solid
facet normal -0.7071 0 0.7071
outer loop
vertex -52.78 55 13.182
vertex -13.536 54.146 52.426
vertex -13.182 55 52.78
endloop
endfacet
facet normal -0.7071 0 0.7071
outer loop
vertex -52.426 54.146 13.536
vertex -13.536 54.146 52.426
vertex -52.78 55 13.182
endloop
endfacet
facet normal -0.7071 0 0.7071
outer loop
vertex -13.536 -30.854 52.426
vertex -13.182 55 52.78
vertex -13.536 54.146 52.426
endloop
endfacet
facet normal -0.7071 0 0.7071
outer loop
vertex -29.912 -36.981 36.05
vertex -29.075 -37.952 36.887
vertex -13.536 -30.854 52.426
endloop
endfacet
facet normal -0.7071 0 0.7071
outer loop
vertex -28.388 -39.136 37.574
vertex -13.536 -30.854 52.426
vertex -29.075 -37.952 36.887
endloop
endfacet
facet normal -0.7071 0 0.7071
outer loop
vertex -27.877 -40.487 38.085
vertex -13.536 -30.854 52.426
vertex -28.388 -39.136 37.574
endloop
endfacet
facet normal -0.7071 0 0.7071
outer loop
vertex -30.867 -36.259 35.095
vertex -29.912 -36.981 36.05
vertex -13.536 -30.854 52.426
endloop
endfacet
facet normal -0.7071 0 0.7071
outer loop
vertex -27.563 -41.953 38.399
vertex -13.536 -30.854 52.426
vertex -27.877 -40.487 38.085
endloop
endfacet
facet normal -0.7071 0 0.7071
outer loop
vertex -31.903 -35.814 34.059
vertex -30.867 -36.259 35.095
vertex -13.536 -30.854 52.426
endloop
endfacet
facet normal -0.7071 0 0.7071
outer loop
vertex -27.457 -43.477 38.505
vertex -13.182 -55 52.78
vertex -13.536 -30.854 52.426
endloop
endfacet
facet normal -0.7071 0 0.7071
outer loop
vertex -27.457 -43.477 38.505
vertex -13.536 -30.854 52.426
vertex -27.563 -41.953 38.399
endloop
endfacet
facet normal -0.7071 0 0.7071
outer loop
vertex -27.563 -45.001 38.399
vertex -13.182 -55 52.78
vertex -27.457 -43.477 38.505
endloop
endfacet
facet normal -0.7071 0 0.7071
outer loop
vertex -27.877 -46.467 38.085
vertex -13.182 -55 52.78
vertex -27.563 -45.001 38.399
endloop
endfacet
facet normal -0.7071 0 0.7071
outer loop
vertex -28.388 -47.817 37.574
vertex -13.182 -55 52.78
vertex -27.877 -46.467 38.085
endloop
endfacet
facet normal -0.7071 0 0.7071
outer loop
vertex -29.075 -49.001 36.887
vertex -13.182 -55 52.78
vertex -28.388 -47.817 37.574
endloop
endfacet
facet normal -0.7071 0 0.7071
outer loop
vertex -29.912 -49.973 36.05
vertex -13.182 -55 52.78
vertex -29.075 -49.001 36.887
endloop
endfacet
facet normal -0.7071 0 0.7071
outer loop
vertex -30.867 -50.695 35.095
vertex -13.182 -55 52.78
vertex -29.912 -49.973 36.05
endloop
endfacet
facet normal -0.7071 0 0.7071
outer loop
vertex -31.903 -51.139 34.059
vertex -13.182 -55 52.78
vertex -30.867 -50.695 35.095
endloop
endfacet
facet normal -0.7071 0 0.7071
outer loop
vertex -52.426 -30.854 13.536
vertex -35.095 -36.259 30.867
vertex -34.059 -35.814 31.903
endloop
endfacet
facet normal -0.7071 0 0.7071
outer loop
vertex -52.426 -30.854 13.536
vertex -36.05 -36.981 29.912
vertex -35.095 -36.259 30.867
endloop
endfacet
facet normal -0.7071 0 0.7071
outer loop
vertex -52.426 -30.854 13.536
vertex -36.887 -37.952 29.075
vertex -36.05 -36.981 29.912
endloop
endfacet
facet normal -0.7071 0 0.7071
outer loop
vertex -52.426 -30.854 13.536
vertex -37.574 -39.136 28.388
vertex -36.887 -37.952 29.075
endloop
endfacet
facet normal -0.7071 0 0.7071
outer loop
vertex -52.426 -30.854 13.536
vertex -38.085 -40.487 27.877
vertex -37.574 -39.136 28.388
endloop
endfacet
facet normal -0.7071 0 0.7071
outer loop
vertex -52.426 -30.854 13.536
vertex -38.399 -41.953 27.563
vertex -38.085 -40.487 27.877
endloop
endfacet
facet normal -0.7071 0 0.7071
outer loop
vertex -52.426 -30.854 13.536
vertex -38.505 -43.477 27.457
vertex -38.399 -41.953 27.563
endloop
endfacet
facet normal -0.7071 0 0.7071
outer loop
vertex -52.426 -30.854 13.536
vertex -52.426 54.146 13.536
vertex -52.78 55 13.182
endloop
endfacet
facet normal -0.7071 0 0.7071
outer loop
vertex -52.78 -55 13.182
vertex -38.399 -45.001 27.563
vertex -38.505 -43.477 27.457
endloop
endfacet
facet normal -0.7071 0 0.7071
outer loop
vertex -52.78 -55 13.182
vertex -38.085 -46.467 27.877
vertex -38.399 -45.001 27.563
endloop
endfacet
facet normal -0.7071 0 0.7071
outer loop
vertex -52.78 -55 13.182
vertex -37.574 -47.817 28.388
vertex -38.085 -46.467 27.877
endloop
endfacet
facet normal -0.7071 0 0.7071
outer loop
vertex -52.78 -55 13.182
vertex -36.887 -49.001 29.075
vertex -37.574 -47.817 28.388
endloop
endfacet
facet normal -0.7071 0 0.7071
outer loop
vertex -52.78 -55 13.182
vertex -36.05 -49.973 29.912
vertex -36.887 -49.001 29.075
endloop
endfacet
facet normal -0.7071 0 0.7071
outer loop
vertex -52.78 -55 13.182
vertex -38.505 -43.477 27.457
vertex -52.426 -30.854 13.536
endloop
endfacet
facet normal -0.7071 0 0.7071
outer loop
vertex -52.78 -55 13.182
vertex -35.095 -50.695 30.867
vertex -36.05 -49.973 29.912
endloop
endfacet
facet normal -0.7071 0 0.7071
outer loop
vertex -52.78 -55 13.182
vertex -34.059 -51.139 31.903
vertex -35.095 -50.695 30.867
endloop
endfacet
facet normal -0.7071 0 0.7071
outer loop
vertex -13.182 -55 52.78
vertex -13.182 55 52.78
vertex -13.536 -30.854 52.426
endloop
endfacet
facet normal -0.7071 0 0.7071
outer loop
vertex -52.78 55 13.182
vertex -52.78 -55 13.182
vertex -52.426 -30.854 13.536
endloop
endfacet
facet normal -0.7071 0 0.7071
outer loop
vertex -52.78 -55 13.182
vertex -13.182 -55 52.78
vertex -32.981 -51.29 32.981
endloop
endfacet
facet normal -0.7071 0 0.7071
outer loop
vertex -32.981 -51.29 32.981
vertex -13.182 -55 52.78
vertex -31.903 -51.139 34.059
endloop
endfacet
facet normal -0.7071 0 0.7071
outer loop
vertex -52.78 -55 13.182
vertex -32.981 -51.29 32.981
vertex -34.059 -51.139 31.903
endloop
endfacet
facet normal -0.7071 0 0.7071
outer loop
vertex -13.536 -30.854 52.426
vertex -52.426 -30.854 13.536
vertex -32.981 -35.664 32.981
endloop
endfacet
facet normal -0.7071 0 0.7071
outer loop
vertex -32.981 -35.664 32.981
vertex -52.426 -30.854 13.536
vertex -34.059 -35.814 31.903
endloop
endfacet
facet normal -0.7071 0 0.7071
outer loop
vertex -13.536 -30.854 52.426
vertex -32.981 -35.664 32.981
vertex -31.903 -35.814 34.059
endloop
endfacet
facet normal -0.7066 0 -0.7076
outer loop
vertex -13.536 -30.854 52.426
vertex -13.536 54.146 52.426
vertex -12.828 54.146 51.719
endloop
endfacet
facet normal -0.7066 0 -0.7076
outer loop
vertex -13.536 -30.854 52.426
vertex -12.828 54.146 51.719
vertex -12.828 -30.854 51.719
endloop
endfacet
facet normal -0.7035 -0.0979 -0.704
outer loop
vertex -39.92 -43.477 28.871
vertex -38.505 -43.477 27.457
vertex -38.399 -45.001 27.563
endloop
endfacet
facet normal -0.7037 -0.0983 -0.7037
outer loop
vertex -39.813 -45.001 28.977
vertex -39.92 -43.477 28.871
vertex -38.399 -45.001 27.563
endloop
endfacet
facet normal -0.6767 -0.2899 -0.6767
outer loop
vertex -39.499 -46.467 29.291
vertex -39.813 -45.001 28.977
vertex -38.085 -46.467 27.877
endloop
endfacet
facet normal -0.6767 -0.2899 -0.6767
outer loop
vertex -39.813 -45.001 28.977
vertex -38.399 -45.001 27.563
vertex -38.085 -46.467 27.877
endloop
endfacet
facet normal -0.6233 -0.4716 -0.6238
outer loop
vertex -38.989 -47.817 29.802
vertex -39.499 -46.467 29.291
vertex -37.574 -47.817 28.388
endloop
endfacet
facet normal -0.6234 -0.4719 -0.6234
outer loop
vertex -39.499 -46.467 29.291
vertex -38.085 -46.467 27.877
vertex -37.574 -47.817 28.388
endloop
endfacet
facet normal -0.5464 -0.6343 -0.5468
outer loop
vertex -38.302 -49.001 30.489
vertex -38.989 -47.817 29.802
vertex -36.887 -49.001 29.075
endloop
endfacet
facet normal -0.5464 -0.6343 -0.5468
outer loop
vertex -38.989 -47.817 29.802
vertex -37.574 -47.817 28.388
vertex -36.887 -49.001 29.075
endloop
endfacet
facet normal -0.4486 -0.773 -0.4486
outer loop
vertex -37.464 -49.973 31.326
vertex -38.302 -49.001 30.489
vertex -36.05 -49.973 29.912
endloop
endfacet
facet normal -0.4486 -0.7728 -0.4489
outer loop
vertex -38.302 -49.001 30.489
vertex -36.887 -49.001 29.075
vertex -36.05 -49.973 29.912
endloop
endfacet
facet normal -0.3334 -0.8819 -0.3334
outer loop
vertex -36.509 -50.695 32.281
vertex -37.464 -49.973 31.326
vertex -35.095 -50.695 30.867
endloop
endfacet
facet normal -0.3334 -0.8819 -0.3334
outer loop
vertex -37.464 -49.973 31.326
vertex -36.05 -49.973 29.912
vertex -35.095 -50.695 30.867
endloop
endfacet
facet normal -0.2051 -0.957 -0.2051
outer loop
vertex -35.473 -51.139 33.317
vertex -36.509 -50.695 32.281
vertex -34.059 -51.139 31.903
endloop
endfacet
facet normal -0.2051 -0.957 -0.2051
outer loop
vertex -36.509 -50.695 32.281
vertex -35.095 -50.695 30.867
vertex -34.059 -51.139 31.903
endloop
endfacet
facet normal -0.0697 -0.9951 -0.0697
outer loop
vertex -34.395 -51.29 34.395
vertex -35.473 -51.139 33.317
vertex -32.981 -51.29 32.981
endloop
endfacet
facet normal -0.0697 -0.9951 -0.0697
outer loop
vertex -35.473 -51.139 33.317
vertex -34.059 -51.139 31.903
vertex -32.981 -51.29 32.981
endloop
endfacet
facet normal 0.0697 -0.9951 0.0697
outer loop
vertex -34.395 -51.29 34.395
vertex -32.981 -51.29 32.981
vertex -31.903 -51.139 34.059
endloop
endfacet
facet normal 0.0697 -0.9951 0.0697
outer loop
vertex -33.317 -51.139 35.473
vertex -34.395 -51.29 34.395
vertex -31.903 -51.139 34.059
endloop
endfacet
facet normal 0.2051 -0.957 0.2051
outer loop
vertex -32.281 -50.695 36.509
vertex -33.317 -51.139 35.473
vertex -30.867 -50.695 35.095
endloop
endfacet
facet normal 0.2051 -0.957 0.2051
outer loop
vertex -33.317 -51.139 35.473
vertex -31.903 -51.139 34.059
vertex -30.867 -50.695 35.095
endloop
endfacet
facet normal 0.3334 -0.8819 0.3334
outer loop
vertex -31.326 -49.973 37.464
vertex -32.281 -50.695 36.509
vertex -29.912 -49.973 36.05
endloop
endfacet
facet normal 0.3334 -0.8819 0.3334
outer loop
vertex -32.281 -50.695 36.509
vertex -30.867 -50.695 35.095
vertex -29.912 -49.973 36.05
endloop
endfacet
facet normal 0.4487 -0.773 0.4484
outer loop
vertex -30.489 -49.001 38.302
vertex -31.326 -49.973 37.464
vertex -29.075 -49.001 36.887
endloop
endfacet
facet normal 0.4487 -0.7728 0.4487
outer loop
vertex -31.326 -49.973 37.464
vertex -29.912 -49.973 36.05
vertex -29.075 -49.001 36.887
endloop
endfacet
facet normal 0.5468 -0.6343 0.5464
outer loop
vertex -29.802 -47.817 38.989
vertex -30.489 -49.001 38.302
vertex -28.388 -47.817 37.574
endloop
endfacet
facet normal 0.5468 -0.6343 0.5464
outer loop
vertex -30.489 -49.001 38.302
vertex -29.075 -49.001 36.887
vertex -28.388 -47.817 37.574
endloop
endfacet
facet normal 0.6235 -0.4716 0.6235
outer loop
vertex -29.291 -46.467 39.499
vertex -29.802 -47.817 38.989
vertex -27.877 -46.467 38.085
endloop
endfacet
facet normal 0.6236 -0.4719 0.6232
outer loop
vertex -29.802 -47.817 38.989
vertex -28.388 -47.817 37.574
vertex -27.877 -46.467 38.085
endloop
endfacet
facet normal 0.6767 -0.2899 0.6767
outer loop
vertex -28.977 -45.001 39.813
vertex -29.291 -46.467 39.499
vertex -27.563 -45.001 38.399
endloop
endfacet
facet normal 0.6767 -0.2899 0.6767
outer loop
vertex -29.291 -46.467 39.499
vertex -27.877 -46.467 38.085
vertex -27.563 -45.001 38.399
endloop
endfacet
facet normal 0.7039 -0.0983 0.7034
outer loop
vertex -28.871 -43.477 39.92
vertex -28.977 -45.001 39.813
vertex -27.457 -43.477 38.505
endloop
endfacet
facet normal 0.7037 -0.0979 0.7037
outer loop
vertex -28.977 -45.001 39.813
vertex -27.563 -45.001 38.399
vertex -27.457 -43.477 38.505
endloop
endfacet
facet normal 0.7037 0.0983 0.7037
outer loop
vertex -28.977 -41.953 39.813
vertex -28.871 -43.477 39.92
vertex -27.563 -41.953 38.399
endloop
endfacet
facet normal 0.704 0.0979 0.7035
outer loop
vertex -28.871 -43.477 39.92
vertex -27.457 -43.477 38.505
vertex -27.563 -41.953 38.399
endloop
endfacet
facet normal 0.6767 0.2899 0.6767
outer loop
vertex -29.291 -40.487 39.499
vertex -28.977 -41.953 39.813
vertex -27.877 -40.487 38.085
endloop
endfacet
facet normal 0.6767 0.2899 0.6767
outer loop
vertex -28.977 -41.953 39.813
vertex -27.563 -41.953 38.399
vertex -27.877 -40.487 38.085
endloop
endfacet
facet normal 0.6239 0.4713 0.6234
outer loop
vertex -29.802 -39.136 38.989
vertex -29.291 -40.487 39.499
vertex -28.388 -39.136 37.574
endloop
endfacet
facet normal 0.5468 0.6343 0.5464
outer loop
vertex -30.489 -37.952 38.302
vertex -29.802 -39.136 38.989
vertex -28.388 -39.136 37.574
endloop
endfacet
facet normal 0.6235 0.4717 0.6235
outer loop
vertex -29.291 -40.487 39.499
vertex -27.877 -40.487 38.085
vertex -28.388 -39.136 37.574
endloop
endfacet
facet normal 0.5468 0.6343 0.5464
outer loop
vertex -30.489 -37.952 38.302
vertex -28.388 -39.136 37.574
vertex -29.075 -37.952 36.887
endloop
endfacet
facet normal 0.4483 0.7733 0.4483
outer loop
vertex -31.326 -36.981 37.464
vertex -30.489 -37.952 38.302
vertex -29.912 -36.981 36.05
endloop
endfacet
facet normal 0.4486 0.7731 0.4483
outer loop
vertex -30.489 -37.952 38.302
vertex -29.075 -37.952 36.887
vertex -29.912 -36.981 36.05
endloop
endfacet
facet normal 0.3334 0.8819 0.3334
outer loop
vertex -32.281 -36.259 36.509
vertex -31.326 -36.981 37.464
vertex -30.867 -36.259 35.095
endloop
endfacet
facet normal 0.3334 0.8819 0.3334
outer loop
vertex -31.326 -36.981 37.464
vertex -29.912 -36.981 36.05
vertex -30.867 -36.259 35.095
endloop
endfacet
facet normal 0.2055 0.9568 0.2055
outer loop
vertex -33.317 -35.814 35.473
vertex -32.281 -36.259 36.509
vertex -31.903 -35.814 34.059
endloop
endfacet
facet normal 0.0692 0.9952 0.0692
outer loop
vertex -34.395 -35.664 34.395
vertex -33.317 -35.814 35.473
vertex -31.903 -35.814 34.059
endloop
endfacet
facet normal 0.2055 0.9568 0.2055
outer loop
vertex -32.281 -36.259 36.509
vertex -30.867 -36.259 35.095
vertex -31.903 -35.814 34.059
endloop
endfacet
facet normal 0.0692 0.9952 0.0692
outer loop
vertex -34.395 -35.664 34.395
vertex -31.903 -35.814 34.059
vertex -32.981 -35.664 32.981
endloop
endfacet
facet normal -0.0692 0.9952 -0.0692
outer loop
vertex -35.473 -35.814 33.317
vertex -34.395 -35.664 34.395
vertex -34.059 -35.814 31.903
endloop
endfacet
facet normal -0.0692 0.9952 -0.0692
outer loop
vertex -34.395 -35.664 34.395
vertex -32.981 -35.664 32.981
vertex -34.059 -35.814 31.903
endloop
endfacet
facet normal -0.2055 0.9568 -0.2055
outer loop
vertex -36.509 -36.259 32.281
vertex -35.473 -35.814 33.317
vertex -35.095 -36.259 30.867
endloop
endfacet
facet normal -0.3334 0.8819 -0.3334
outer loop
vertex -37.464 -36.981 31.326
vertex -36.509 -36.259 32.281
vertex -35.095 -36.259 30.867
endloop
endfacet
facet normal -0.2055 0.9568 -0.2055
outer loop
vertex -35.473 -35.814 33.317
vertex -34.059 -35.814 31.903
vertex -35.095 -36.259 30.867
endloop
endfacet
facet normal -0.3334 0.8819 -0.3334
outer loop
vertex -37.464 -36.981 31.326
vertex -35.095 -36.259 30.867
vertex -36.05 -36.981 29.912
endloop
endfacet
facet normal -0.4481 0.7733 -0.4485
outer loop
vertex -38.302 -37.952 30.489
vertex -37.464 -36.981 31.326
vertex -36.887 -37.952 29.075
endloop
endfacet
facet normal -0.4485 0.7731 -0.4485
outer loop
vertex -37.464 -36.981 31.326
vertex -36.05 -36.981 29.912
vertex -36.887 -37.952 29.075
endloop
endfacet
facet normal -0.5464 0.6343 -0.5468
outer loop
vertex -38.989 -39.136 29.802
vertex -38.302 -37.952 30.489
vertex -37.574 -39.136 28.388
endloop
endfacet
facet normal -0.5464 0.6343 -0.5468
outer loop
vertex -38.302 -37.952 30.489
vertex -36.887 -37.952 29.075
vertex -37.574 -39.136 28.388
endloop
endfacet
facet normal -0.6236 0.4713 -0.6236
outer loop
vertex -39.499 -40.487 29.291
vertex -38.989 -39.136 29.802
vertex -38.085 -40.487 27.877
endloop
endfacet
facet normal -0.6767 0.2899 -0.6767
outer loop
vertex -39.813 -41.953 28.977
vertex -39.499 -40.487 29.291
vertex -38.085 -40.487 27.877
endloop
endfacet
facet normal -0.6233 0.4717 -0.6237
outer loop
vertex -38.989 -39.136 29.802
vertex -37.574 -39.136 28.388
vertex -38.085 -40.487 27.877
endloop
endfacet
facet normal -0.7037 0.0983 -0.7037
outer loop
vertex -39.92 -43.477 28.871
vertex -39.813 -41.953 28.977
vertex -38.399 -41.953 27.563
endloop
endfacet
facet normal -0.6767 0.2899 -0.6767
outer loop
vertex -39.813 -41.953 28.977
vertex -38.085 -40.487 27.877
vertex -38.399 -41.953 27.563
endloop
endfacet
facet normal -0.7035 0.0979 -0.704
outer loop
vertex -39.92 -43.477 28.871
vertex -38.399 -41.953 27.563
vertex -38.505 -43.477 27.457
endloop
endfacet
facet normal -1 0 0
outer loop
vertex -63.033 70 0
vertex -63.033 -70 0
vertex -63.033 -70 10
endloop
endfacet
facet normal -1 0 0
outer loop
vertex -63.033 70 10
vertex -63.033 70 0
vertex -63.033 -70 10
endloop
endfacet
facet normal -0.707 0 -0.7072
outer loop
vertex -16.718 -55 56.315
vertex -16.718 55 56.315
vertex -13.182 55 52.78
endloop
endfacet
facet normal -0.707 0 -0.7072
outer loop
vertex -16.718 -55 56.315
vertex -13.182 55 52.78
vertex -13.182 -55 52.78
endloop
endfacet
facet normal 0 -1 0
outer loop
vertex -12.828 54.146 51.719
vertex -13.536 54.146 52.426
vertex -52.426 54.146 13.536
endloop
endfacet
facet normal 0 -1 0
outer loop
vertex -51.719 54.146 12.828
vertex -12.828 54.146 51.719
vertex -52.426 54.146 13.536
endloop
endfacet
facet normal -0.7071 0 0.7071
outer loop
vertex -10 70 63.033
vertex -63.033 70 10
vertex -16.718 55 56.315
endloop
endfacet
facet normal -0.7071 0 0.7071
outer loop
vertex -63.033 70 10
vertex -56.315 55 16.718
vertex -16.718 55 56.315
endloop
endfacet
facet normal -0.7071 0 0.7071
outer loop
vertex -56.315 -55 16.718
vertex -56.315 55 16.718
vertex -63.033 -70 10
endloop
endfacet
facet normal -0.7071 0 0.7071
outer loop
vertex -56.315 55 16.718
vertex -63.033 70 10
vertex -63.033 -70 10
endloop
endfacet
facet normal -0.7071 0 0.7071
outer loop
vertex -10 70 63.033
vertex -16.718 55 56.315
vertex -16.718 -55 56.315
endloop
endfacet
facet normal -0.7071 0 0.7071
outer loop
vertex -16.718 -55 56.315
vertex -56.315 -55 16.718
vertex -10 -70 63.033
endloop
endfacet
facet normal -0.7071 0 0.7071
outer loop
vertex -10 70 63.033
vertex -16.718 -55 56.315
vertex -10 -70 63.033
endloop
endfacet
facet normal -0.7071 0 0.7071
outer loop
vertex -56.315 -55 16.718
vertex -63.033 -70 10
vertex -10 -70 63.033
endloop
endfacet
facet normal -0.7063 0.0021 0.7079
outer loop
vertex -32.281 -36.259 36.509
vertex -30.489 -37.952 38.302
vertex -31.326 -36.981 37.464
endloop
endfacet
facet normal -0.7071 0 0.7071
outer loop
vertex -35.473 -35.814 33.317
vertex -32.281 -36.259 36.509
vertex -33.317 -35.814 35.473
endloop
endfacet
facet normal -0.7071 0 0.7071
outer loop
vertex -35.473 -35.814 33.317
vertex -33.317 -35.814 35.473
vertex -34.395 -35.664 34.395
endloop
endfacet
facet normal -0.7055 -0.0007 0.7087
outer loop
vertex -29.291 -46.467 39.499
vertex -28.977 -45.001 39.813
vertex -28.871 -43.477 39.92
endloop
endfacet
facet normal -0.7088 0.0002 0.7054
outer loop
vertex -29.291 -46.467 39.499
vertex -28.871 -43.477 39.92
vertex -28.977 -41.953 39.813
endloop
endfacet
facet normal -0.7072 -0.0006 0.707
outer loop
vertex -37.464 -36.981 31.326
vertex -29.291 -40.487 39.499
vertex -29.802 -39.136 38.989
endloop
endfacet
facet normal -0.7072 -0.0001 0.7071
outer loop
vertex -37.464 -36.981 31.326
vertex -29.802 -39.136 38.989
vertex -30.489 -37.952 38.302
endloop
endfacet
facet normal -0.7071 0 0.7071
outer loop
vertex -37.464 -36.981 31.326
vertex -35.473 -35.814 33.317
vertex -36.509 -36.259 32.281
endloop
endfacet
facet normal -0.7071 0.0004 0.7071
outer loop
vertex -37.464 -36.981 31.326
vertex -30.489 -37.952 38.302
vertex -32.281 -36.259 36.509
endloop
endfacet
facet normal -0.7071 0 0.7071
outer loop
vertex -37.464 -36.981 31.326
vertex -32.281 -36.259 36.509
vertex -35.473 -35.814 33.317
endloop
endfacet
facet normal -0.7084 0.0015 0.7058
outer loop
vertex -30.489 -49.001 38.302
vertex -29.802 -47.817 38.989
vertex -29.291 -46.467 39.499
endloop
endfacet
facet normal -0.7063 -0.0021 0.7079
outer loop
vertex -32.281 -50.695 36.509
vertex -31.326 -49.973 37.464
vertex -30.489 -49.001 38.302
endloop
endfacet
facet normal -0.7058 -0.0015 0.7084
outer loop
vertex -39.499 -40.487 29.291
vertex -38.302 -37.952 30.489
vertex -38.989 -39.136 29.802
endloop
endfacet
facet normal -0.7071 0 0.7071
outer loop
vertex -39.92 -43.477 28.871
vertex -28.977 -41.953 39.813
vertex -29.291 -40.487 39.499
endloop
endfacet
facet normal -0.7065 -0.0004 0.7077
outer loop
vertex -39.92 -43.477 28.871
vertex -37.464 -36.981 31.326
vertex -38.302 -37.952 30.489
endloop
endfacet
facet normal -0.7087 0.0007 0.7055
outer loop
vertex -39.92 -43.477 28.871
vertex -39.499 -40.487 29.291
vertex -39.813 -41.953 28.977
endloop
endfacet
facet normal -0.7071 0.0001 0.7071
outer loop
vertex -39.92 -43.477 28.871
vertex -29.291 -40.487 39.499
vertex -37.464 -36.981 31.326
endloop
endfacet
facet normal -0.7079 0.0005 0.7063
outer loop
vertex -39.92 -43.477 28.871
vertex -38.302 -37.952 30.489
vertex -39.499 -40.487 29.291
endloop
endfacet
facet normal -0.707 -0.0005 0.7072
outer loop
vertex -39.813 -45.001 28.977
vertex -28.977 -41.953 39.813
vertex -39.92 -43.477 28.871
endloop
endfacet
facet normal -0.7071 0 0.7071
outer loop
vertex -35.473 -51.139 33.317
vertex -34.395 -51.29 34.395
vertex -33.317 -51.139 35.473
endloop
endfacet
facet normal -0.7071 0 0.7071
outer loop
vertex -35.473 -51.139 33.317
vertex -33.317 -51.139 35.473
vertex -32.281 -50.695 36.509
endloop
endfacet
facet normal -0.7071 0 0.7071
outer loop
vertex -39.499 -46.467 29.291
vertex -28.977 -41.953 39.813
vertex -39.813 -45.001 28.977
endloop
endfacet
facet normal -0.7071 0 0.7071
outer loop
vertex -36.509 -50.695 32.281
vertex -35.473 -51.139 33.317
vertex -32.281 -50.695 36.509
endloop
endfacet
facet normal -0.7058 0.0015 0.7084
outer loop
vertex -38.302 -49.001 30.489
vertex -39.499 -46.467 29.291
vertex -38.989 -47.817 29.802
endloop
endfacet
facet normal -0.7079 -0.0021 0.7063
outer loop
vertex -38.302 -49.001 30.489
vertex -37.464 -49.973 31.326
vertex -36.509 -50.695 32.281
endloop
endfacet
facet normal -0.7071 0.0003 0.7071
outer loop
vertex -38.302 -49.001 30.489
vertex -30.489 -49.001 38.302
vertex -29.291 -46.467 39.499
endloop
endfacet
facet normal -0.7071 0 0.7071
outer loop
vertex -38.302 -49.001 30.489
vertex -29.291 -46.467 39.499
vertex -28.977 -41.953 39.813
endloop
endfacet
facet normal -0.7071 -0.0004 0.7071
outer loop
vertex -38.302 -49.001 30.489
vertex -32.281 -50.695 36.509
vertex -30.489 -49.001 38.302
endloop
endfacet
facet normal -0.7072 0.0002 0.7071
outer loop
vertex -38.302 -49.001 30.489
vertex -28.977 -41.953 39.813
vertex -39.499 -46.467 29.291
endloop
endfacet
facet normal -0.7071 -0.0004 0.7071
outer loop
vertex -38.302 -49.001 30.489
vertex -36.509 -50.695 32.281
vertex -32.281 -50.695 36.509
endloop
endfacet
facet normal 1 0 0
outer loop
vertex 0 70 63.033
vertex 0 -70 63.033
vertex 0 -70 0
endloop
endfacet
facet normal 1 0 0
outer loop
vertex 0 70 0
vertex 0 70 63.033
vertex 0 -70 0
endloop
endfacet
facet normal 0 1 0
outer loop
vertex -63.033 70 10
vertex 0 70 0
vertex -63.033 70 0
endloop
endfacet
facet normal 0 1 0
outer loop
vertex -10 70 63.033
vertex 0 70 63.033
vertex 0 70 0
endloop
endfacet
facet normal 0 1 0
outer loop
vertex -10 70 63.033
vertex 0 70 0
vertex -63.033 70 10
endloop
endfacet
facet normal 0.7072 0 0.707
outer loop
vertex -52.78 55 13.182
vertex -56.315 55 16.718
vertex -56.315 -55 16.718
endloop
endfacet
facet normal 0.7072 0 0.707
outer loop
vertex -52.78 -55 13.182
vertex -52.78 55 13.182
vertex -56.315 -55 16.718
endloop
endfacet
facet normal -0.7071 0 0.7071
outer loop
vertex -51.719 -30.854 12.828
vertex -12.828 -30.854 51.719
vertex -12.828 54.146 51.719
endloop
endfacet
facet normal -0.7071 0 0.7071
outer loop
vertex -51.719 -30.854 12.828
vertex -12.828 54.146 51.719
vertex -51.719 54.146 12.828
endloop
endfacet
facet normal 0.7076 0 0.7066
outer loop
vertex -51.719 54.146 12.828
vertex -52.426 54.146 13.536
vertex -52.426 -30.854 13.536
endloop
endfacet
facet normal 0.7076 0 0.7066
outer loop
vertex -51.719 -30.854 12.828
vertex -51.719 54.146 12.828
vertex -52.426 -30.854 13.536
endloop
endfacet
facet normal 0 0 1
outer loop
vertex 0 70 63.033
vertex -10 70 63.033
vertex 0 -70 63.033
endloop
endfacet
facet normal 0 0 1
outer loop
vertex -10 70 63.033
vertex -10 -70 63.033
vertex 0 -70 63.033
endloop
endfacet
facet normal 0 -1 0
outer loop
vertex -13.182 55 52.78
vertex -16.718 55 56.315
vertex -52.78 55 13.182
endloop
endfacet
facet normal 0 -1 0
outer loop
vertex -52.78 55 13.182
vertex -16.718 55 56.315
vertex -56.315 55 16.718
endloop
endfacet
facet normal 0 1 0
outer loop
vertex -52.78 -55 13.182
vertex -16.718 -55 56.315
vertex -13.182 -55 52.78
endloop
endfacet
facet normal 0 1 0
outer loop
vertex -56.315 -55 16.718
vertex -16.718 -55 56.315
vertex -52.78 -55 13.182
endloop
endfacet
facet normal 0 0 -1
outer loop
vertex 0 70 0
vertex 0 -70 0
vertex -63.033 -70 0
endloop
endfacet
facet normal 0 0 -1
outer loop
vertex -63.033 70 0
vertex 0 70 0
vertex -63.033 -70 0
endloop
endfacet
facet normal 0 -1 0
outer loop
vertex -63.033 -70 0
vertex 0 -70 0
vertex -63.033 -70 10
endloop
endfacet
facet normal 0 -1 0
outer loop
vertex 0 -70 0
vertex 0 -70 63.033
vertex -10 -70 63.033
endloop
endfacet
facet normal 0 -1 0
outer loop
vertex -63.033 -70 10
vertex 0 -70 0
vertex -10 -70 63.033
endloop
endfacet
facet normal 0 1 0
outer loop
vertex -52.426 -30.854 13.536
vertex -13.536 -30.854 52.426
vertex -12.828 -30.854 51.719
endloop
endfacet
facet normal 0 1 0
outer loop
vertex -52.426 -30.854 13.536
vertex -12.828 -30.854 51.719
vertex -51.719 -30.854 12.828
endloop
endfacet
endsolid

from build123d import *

# Parameters (mm, degrees)
PAD_DEPTH       = 70
PAD_DEPTH_BACK  = 70
SKETCH001_W     = 56
SKETCH001_H     = 110
POCKET_DEPTH    = 5
SKETCH002_W     = 55
SKETCH002_H     = 85
POCKET001_DEPTH = 1
SKETCH003_R     = 7.812733
PAD001_DEPTH    = 2


with BuildPart() as part:
    # Sketch → Pad (new body, two sides)
    with BuildSketch(Plane.XZ) as pad_sk:
        Polygon((-63.033008589, 0), (-63.033008589, 10), (-10, 63.033008589), (0, 63.033008589), (0, 0), align=None)
    extrude(amount=PAD_DEPTH)
    extrude(pad_sk.sketch, amount=-PAD_DEPTH_BACK)

    # Sketch001 (on Face2 of Pad) → Pocket (cut)
    with BuildSketch(Plane(origin=(-36.5165042945, 0, 36.5165042945), x_dir=(-0.7071067812, 0, -0.7071067812), z_dir=(-0.7071067812, 0, 0.7071067812))):
        Rectangle(SKETCH001_W, SKETCH001_H)
    extrude(amount=-POCKET_DEPTH, mode=Mode.SUBTRACT)

    # Sketch002 (on Face12 of Pocket) → Pocket001 (cut)
    with BuildSketch(Plane(origin=(-32.9809703886, 0, 32.9809703886), x_dir=(-0.7071067812, 0, -0.7071067812), z_dir=(-0.7071067812, 0, 0.7071067812))):
        with Locations((0, -11.6462930524)):
            Rectangle(SKETCH002_W, SKETCH002_H)
    extrude(amount=-POCKET001_DEPTH, mode=Mode.SUBTRACT)

    # Sketch003 (on Face12 of Pocket001) → Pad001 (join)
    with BuildSketch(Plane(origin=(-32.9809703886, 0, 32.9809703886), x_dir=(-0.7071067812, 0, -0.7071067812), z_dir=(-0.7071067812, 0, 0.7071067812))):
        with Locations((0, 43.476822)):
            Circle(SKETCH003_R)
    extrude(amount=PAD001_DEPTH)


solid = part.part
